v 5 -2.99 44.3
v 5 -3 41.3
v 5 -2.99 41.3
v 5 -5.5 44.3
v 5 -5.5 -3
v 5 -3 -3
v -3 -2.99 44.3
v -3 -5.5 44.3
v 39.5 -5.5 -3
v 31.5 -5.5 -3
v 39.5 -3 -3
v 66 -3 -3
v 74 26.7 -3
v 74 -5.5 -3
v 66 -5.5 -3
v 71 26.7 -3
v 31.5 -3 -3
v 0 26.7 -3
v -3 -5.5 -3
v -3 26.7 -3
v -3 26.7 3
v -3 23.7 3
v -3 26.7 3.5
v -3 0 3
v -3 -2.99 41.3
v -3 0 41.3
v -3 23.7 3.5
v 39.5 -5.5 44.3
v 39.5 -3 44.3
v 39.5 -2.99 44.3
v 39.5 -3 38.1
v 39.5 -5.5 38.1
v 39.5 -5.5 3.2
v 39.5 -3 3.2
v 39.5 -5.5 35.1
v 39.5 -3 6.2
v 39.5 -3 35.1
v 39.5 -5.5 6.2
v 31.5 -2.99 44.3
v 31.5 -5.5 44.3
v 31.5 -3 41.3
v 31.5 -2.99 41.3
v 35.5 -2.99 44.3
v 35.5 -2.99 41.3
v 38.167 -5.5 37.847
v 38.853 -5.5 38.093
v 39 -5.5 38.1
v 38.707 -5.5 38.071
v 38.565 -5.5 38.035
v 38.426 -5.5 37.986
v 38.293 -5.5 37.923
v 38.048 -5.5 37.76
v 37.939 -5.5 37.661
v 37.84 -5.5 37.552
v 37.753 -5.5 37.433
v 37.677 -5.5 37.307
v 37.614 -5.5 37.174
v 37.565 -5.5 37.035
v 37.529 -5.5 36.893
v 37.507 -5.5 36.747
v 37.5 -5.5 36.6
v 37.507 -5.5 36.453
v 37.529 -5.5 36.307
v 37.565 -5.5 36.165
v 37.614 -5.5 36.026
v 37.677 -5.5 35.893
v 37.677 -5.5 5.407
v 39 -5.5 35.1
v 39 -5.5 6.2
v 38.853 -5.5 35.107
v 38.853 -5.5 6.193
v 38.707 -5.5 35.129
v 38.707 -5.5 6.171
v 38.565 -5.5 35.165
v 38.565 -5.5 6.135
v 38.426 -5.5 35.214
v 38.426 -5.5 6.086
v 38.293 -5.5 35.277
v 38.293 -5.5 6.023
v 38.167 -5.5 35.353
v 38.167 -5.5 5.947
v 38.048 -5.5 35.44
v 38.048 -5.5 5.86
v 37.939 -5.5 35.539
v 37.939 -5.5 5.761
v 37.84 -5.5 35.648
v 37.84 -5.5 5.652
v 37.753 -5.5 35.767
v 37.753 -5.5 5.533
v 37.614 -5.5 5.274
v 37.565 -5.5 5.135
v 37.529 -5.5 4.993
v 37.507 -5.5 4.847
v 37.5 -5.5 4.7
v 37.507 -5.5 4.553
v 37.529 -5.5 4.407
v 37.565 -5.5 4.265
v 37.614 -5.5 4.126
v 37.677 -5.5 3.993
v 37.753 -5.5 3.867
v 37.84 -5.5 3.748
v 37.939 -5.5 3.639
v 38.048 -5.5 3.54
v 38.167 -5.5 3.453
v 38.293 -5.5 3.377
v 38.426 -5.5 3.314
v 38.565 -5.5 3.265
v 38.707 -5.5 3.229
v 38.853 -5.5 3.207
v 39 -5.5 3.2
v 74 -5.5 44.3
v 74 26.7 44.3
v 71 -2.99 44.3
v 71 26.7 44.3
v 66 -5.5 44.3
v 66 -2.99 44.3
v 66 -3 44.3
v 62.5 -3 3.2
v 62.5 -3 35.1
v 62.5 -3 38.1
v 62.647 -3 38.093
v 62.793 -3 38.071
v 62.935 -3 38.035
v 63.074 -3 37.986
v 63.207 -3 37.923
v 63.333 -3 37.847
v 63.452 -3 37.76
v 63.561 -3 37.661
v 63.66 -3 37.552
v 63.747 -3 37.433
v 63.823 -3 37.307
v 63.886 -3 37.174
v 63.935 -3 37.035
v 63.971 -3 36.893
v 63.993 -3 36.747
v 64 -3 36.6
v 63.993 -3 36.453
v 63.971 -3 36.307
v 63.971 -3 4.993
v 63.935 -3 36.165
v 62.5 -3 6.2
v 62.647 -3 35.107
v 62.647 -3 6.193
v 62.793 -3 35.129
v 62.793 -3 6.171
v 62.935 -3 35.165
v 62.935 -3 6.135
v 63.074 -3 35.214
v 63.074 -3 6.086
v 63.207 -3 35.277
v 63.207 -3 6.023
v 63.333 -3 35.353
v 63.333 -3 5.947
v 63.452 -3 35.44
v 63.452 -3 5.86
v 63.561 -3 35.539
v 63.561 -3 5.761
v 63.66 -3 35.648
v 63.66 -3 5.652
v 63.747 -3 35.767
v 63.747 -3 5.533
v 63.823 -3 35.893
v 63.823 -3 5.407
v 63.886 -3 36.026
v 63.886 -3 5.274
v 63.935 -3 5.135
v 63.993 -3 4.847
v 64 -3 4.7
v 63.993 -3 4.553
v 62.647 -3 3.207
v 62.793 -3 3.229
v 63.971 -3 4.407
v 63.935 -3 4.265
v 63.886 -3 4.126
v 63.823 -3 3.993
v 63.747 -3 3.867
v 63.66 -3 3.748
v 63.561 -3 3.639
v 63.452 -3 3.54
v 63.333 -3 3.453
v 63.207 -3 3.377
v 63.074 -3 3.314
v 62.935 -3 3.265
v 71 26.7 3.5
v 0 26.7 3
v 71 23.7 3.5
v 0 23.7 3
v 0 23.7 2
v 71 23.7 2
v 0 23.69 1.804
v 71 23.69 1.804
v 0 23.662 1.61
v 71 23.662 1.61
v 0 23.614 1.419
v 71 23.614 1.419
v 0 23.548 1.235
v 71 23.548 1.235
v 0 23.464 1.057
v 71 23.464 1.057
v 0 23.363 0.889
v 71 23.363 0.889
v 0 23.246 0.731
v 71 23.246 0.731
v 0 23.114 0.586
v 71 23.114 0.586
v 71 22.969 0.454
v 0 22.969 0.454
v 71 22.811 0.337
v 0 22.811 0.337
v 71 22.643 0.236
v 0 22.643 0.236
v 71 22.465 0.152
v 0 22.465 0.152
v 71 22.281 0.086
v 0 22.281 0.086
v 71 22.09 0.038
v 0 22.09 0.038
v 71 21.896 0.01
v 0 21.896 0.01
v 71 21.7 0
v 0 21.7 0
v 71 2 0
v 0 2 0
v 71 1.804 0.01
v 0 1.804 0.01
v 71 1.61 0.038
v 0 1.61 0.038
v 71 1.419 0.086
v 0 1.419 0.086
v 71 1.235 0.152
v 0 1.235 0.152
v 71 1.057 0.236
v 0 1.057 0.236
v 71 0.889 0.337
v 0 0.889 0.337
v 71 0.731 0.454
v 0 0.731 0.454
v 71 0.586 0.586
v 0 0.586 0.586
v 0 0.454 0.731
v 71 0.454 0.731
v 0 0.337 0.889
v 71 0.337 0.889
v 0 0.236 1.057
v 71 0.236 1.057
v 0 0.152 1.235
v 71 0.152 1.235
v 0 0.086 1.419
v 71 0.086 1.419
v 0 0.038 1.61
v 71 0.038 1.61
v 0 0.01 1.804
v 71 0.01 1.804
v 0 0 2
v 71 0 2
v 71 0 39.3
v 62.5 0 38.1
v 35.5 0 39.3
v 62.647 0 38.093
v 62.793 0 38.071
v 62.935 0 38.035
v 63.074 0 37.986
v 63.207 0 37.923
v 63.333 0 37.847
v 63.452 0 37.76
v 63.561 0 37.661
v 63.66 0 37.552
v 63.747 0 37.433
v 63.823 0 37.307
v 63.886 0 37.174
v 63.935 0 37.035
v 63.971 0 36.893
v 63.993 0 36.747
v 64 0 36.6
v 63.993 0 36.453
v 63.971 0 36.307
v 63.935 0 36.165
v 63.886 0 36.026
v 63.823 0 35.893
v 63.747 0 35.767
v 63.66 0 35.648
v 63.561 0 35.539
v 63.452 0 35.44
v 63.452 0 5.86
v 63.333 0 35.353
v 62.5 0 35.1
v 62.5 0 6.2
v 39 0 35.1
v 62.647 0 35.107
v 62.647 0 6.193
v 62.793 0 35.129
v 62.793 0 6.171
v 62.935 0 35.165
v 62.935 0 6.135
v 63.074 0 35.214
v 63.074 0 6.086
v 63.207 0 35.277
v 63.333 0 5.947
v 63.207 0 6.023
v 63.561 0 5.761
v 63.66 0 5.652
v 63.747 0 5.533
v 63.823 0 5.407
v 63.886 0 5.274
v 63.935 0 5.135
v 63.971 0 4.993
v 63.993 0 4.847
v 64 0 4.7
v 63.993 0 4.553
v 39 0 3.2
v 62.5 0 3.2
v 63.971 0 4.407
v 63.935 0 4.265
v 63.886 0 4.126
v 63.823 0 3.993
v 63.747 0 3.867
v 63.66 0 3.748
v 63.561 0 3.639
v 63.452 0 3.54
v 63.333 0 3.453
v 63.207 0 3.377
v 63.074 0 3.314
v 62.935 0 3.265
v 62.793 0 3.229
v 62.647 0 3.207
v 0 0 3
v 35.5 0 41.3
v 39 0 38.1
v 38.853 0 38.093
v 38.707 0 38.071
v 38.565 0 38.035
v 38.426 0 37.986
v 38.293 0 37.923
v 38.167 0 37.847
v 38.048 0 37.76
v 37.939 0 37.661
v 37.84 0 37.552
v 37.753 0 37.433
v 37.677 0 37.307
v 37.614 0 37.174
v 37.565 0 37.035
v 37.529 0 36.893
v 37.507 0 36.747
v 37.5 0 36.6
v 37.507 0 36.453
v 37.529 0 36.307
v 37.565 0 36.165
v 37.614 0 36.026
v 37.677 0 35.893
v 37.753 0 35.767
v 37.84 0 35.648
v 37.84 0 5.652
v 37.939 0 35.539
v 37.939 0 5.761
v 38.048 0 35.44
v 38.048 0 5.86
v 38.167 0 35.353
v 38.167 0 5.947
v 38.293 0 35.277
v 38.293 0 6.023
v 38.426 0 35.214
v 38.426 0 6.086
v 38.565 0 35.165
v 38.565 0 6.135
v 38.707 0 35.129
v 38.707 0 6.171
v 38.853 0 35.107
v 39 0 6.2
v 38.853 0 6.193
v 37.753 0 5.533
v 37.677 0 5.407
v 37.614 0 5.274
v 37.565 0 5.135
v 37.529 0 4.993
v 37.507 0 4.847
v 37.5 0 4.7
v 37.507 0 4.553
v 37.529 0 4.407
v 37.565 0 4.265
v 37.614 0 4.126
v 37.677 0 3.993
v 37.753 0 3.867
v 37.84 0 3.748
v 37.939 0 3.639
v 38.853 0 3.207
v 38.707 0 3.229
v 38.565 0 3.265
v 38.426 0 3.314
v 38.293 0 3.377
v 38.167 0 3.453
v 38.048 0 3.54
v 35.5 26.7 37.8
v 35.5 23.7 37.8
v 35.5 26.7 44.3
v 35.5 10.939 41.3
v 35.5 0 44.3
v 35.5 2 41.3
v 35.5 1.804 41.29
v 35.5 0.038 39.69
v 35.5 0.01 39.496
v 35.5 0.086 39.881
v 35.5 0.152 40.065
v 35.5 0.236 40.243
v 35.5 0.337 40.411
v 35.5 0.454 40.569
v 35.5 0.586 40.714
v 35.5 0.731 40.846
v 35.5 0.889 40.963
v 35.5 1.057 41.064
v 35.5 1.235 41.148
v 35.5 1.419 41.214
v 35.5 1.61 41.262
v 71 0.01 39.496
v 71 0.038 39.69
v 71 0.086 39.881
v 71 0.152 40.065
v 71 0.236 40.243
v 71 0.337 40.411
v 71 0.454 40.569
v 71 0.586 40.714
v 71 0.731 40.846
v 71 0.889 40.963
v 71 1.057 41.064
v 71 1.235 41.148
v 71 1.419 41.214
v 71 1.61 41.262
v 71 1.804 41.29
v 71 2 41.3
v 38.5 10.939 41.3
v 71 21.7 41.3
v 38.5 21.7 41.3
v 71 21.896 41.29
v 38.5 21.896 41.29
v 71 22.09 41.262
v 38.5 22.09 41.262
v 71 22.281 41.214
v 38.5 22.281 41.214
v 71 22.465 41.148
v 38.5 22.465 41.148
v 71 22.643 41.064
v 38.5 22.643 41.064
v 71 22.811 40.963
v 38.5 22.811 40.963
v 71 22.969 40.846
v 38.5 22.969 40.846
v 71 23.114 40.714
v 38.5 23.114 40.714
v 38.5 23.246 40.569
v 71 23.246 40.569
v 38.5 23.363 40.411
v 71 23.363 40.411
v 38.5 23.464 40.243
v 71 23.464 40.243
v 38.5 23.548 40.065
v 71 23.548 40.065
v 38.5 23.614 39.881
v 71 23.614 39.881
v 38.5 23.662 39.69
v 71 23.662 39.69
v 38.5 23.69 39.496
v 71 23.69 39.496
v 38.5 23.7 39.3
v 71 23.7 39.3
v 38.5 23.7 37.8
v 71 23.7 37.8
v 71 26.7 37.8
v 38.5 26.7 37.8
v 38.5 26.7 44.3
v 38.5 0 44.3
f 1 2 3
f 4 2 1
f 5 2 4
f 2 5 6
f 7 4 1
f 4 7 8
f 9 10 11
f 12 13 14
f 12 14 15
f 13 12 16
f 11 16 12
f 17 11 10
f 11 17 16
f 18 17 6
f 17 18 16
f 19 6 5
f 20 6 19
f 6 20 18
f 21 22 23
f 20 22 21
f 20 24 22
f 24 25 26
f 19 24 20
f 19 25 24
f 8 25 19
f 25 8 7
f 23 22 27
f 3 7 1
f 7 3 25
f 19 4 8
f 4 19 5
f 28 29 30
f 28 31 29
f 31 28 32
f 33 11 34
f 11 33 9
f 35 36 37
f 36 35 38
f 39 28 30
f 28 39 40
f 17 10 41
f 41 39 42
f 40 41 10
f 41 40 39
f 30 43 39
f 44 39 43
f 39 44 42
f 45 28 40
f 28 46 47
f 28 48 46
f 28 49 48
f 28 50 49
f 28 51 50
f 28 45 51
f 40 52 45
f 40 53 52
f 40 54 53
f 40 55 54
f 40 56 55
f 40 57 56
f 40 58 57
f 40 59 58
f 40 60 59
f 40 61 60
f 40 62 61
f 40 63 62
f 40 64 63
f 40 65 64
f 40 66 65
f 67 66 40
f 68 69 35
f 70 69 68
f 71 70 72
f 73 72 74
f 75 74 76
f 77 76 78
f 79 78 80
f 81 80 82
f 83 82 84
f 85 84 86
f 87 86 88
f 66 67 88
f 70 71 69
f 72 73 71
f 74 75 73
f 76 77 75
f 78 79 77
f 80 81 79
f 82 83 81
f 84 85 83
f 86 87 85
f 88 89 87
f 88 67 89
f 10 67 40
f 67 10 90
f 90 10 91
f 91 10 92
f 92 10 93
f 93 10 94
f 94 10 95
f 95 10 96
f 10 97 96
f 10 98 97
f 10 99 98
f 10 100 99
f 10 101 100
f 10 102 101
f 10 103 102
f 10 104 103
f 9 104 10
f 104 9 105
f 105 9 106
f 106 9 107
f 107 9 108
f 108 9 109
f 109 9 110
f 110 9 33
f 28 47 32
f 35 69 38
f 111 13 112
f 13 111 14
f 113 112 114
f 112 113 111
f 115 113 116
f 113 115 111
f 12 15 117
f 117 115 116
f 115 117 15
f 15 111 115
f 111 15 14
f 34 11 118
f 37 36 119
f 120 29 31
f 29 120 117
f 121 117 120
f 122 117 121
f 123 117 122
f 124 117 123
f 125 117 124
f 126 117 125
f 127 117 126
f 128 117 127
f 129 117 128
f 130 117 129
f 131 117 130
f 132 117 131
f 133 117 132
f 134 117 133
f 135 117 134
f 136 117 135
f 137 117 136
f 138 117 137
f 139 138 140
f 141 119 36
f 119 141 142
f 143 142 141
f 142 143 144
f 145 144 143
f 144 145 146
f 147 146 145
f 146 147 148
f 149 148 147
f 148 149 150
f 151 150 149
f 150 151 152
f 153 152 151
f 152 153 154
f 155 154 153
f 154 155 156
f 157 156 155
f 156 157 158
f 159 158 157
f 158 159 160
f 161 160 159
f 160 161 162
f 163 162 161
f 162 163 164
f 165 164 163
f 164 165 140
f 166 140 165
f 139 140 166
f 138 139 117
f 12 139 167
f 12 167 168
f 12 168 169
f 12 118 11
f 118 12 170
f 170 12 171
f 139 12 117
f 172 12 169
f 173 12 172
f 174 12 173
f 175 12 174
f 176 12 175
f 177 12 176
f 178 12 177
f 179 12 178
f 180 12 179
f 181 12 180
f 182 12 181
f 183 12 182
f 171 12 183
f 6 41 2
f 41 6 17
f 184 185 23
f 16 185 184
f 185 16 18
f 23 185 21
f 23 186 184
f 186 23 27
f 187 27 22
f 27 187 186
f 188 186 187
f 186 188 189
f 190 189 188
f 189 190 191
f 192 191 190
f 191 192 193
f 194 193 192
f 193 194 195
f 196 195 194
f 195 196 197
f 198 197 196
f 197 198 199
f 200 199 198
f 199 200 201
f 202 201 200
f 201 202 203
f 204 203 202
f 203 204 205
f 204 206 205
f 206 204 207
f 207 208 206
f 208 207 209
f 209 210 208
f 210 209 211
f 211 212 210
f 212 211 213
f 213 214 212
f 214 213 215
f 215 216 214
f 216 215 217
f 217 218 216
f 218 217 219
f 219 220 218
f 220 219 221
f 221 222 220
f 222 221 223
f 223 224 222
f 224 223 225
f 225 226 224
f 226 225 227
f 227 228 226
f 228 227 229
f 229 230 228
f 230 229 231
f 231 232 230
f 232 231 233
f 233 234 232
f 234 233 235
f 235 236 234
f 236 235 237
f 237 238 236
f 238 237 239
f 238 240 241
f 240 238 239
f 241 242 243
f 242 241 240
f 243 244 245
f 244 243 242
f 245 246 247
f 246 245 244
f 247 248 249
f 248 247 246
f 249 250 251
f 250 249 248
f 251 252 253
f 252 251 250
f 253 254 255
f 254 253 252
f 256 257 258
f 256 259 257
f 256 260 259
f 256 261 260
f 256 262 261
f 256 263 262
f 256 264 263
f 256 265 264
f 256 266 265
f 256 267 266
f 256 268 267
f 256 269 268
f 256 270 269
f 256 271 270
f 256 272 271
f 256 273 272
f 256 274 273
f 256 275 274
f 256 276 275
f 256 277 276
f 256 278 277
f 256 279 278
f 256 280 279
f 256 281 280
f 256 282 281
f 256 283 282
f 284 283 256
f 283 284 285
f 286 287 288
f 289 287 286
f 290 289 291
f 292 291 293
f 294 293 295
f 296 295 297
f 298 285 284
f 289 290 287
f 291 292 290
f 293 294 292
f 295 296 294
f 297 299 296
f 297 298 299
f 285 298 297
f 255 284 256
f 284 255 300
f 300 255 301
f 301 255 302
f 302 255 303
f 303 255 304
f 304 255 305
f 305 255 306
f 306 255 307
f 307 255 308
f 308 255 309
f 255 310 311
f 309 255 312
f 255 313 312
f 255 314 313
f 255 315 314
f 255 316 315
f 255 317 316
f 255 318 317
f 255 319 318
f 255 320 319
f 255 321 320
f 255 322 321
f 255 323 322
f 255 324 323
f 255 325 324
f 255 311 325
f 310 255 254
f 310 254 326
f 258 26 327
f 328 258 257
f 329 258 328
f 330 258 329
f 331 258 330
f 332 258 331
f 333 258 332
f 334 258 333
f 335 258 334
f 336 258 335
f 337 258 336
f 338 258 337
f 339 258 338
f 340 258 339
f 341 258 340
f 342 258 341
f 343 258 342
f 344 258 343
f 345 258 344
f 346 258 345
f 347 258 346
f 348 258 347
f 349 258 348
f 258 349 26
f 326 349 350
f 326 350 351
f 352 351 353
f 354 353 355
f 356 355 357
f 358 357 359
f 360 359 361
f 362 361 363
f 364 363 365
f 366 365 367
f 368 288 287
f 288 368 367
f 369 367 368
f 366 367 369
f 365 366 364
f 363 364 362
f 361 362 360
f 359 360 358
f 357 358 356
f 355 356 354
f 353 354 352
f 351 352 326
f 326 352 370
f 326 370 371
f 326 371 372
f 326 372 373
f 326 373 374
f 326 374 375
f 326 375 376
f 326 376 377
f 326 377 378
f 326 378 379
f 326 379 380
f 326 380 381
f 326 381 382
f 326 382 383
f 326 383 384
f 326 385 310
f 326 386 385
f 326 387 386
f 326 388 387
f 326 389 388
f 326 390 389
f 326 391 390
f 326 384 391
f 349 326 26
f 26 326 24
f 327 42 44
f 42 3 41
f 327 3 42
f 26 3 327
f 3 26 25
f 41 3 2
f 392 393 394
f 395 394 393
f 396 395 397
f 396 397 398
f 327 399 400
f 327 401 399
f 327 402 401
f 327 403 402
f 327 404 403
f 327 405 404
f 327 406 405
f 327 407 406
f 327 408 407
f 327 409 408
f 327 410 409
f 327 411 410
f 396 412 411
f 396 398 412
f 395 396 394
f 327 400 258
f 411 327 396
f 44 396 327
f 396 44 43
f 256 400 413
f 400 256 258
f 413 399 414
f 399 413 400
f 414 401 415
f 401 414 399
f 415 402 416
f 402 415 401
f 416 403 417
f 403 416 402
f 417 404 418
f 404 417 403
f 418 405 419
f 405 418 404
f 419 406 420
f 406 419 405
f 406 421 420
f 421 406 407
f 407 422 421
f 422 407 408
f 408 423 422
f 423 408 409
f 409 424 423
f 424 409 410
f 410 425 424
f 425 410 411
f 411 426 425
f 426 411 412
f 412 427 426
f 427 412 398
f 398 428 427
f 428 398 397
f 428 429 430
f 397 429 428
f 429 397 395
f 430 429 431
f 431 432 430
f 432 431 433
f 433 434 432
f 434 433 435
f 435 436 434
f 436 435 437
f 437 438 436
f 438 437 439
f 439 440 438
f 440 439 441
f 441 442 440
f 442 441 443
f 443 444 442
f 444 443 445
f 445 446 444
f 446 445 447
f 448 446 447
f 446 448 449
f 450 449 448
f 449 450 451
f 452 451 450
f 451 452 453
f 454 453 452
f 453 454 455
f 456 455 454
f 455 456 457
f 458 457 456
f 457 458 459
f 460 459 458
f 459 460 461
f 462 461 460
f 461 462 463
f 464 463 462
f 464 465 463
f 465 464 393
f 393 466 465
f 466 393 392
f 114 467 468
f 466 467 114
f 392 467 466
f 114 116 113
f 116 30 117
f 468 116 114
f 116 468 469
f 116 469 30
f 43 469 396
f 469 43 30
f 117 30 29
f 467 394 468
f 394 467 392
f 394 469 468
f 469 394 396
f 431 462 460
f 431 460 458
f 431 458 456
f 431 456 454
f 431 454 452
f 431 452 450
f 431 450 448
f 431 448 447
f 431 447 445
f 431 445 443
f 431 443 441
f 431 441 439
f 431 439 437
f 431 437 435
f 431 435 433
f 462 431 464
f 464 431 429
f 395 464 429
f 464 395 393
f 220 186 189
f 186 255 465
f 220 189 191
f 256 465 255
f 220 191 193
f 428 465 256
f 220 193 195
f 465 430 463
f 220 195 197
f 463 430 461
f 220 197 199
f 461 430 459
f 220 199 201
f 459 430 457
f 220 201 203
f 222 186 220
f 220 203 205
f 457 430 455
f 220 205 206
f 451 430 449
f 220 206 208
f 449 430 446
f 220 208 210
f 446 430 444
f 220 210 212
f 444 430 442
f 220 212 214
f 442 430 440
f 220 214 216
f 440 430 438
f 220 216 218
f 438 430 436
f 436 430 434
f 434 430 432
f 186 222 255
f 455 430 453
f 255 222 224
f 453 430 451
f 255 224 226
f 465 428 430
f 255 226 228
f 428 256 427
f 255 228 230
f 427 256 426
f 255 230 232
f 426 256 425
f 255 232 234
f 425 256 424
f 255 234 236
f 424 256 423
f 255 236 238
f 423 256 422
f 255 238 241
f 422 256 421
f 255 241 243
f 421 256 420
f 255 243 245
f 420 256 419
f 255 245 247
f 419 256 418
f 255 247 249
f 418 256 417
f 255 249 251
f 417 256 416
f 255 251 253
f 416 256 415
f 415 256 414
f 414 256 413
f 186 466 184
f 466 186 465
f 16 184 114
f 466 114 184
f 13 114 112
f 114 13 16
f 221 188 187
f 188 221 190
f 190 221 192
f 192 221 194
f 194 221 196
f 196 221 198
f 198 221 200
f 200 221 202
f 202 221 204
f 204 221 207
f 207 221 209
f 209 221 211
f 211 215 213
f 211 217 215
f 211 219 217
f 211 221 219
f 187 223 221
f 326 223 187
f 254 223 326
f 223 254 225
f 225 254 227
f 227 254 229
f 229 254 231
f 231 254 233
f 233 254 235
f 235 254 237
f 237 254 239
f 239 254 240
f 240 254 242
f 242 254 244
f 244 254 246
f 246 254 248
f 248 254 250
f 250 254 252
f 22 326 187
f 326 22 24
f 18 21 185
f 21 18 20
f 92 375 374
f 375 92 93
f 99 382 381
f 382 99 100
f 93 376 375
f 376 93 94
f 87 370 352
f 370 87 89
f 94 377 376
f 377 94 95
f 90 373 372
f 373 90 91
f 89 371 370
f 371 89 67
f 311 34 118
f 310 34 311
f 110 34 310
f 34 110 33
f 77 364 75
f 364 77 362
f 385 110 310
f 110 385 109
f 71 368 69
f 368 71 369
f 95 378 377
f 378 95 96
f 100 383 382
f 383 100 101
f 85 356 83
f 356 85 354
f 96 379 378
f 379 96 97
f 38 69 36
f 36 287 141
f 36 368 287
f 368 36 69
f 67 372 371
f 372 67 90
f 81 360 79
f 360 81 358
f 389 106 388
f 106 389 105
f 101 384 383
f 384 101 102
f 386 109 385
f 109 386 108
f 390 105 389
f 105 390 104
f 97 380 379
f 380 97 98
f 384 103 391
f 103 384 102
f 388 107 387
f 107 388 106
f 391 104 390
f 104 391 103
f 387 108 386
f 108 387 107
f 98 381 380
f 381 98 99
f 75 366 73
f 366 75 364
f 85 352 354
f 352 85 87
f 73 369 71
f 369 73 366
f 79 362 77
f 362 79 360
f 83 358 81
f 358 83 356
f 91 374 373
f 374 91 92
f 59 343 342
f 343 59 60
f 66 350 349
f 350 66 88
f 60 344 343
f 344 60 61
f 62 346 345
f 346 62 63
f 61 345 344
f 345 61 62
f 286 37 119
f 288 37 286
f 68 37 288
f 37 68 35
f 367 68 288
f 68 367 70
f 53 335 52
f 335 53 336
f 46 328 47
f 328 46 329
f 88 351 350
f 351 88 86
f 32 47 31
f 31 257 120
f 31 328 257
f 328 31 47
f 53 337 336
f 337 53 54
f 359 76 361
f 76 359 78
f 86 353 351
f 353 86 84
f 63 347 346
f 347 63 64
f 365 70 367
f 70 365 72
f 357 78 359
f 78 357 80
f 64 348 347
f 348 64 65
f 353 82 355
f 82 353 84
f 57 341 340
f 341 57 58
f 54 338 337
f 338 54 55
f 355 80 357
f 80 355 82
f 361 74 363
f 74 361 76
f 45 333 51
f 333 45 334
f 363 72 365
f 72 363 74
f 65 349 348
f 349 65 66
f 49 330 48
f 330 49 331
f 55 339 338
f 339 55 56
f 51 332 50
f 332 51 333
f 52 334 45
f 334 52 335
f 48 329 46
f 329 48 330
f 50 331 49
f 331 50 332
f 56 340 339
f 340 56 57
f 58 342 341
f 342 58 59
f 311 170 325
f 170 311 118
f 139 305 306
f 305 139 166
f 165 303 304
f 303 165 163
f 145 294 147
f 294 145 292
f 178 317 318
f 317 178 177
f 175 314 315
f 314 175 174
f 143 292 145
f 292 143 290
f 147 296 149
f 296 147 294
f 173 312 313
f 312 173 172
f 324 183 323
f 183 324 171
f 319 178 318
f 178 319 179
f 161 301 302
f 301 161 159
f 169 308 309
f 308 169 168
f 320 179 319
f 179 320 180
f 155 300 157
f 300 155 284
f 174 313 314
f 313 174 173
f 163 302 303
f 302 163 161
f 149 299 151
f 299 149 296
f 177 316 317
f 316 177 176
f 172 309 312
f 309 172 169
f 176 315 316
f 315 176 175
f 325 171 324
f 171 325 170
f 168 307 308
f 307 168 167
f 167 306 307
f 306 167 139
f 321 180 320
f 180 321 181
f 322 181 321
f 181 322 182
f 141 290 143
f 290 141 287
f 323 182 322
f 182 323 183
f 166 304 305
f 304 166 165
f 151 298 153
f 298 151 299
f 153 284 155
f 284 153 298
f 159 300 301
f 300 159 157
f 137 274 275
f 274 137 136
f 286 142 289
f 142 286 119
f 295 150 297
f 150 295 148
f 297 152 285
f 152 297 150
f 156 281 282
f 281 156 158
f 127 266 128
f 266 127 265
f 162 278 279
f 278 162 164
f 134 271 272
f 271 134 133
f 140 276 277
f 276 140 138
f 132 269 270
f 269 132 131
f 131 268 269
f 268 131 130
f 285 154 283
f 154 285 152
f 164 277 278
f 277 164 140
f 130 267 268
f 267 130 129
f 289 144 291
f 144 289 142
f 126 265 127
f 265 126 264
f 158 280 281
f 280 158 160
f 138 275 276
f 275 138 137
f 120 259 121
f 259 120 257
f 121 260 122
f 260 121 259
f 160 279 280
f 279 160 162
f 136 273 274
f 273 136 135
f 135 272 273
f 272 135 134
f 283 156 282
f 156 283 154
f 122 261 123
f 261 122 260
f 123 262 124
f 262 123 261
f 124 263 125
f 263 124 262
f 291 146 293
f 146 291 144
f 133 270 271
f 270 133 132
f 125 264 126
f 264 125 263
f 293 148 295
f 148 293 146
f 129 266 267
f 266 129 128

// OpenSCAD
// =============================================================================
// OpenSCAD Vape Holder Mount
// Based on specification: vape-mount.md & measurements.md
// Compatible with OpenSCAD 2021.01+ and 2026+ Customizer
// =============================================================================
//
// DESIGN SUMMARY:
// - A rigid back plate with a compliant foam/rubber pad (thickness 'p').
// - Full-length bottom lip shelf with front overhang ('O_bottom') to support weight.
// - Partial-length top lip shelf with front overhang ('O_top', length 'L_top_lip')
//   covering the end away from the mouthpiece.
// - Mouthpiece end is completely open so the vape can tilt in/out with one hand
//   and the mouthpiece is never touched or covered.
// - Dual strap slots (top and bottom) with fully radiused edges for 15-20mm straps.
// - Rear standoff rails to provide clearance for straps behind the back plate.
// - Configurable end stops: low wall (~3mm) at mouthpiece end, positive stop at far end.
// - Test piece modes: Section 8 Fit Coupon slice and Lip Test piece.
// =============================================================================

/* [Part Selector (Sec 8 Test Plan)] */
// Which part to render
part = "full"; // ["full": Full Vape Holder, "fit_coupon": Fit Coupon Slice (Sec 8.1), "lip_test": Lip & Strap Slot Test Piece (Sec 8.2), "vape_mockup": Vape Mockup Reference Only]

// Display translucent reference vape in preview mode ($preview)
show_vape_ghost = true;

// Thickness of the fit coupon slice (Sec 8.1: 5-10mm recommended)
coupon_thickness = 8.0; // [4:1:20]

// Print orientation for STL export
export_orientation = "as_modeled"; // ["as_modeled": Native upright, "lay_flat_back": Flat on back plate, "stand_on_end": Standing on far end (zero overhangs!)]

/* [Mount Orientation & Vape Presets] */
// Mount orientation on bike
mount_orientation = "horizontal"; // ["horizontal": Long axis along bar, "vertical": Upright vertical, "custom": Custom parameters]

/* [Vape Measurements (Calipers)] */
// Measurements from measurments.md (Lost Mary OS5000 / BM6000 series)
// Length of main body (excluding mouthpiece protrusion)
vape_body_length = 70.0; // [30:0.5:150]
// Height of body when mounted (top edge to bottom edge)
vape_body_height = 40.3; // [20:0.5:100]
// Thickness/depth of body (front-to-back at thickest point)
vape_body_thickness = 21.2; // [10:0.5:50]
// Corner radius of the vape body
vape_corner_radius = 5.0; // [0:0.5:15]
// Length of mouthpiece section that must stay uncovered (Sec 4.1 & 5.6)
vape_mouth_length = 15.3; // [0:0.5:40]
// Protrusion height of mouthpiece beyond body
vape_mouth_height = 15.0; // [0:0.5:30]
// Width of mouthpiece tube
vape_mouth_width = 16.0; // [5:0.5:30]

/* [Design Variables (Sec 4.2)] */
// Total clearance/slack taken up by pad (Sec 4.2)
c = 1.0; // [0.2:0.1:3.0]
// Closed-cell foam or rubber pad thickness on back plate (Sec 4.2)
p = 1.5; // [0:0.1:4.0]
// Minimum wall and plate thickness (Sec 4.2)
t_wall = 3.0; // [2.0:0.5:6.0]
// Bottom lip overhang curling over vape front face (Sec 4.2: 3-4mm)
O_bottom = 3.5; // [2.0:0.5:8.0]
// Top lip overhang curling over vape front face (Sec 4.2: 3-4mm)
O_top = 3.5; // [2.0:0.5:8.0]
// Ratio of top lip length relative to body length (Sec 4.2: ~50%)
top_lip_ratio = 0.50; // [0.20:0.05:0.80]
// Inside corner fillet radius (Sec 4.2: >= 2.0mm)
r_fillet = 2.0; // [1.0:0.5:5.0]

/* [Strap Configuration (Sec 5.5 & 6)] */
// Width of chosen strap (Sec 4.2: 15-20mm)
strap_w = 20.0; // [12:1:25]
// Thickness of chosen strap (Sec 4.2)
strap_t = 1.5; // [1.0:0.1:3.5]
// Enable rear standoff rails for strap clearance behind plate (Sec 5.1 & 10.2)
enable_rear_standoffs = true;
// Depth of rear strap clearance channel (mm)
rear_channel_depth = 2.5; // [1.5:0.5:5.0]

/* [End Stops (Sec 5.7)] */
// Far end stop (away from mouthpiece)
far_end_stop = "full"; // ["full": Full height end cap, "low": Low wall, "none": Open end]
far_end_stop_h = 8.0; // [4:1:30]
// Mouthpiece end stop (Sec 5.7: low wall ~3mm tall to clear mouthpiece)
mouth_end_stop = "low"; // ["low": Low wall, "none": Open end]
mouth_end_stop_h = 3.0; // [2:0.5:6]

/* [Optional Handlebar Mount Fasteners] */
// Optional fastener holes on back plate for mounting bracket
mount_holes = "none"; // ["none": None, "2_hole_m4": 2x M4 clearance holes, "2_hole_m5": 2x M5 clearance holes, "amps_pattern": 4-hole AMPS pattern (30x38mm)]
mount_hole_spacing = 30.0; // [15:1:60]

/* [Resolution] */
$fn = $preview ? 32 : 64;

// =============================================================================
// Calculated Dimensions
// =============================================================================
L_eff = (mount_orientation == "horizontal") ? vape_body_length :
        (mount_orientation == "vertical")   ? vape_body_height : vape_body_length;

H_eff = (mount_orientation == "horizontal") ? vape_body_height :
        (mount_orientation == "vertical")   ? vape_body_length : vape_body_height;

T_eff = vape_body_thickness;

// Cavity internal dimensions (Sec 5.4):
L_cavity = L_eff + c;           // Inner length
H_cavity = H_eff + c;           // Inner height between bottom & top shelves
Y_cavity = p + T_eff + c;       // Inner depth from back plate to front overhangs

// Top lip length (starts from far end, Sec 5.3)
L_top_lip = L_cavity * top_lip_ratio;
L_mouth_clearance = L_cavity - L_top_lip;

// Strap slot dimensions (Sec 5.5: strap_w + 1.5mm, strap_t + 1.5mm)
slot_length = strap_w + 1.5;
slot_height = strap_t + 1.5;

// Extrusion limits along X
x_start = (mouth_end_stop != "none") ? -t_wall : 0;
x_end   = (far_end_stop != "none")   ? L_cavity + t_wall : L_cavity;
L_total = x_end - x_start;

// Rear standoff offset
rear_standoff_y = enable_rear_standoffs ? -t_wall - rear_channel_depth : -t_wall;

// =============================================================================
// 2D Profiles (Extruded along X)
// =============================================================================

// J-Profile: Back Plate + Full-length Bottom Shelf + Bottom Overhang Lip
module j_profile_2d() {
    union() {
        // Outer box profile
        polygon(points=[
            [-t_wall, -t_wall],
            [Y_cavity + t_wall, -t_wall],
            [Y_cavity + t_wall, O_bottom],
            [Y_cavity, O_bottom],
            [Y_cavity, 0],
            [0, 0],
            [0, H_cavity],
            [-t_wall, H_cavity]
        ]);
        
        // Internal Fillet 1: between back plate (Y=0) and bottom shelf (Z=0)
        translate([r_fillet, r_fillet])
        difference() {
            translate([-r_fillet, -r_fillet]) square([r_fillet, r_fillet]);
            circle(r=r_fillet);
        }
        
        // Internal Fillet 2: between bottom shelf (Z=0) and bottom overhang (Y=Y_cavity)
        translate([Y_cavity - r_fillet, r_fillet])
        difference() {
            translate([0, -r_fillet]) square([r_fillet, r_fillet]);
            circle(r=r_fillet);
        }
    }
}

// Top Lip Profile: Top Shelf + Top Overhang Lip (runs along L_top_lip)
module top_lip_profile_2d() {
    union() {
        polygon(points=[
            [-t_wall, H_cavity],
            [0, H_cavity],
            [Y_cavity, H_cavity],
            [Y_cavity, H_cavity - O_top],
            [Y_cavity + t_wall, H_cavity - O_top],
            [Y_cavity + t_wall, H_cavity + t_wall],
            [-t_wall, H_cavity + t_wall]
        ]);
        
        // Internal Fillet 3: between back plate (Y=0) and top shelf (Z=H_cavity)
        translate([r_fillet, H_cavity - r_fillet])
        difference() {
            translate([-r_fillet, 0]) square([r_fillet, r_fillet]);
            circle(r=r_fillet);
        }
        
        // Internal Fillet 4: between top shelf (Z=H_cavity) and top overhang (Y=Y_cavity)
        translate([Y_cavity - r_fillet, H_cavity - r_fillet])
        difference() {
            square([r_fillet, r_fillet]);
            circle(r=r_fillet);
        }
    }
}

// Helper to extrude 2D profile along X-axis
module extrude_profile_x(len) {
    rotate([90, 0, 90])
    linear_extrude(height=len)
    children();
}

// =============================================================================
// 3D Components
// =============================================================================

// Main Solid Body
module holder_solid() {
    union() {
        // 1. Full-length J-profile (back plate + bottom shelf + bottom lip)
        translate([x_start, 0, 0])
            extrude_profile_x(L_total)
            j_profile_2d();
        
        // 2. Partial top lip & shelf (starts from far end, Sec 5.3)
        x_top_start = L_cavity - L_top_lip;
        translate([x_top_start, 0, 0])
            extrude_profile_x(x_end - x_top_start)
            top_lip_profile_2d();
        
        // 3. Top lip lead-in chamfer (helps vape slide and tilt in smoothly)
        lead_in = min(3.0, L_top_lip / 4);
        translate([x_top_start, 0, H_cavity - O_top])
        polyhedron(
            points=[
                [0, Y_cavity, 0],
                [0, Y_cavity + t_wall, 0],
                [0, Y_cavity + t_wall, O_top + t_wall],
                [0, 0, O_top + t_wall],
                [lead_in, Y_cavity, 0],
                [lead_in, Y_cavity + t_wall, 0],
                [lead_in, Y_cavity + t_wall, O_top + t_wall],
                [lead_in, 0, O_top + t_wall]
            ],
            faces=[
                [0,1,2,3], [4,7,6,5],
                [0,4,5,1], [1,5,6,2],
                [2,6,7,3], [3,7,4,0]
            ]
        );
        
        // 4. Far End Stop (Sec 5.7)
        if (far_end_stop == "full") {
            translate([L_cavity, -t_wall, -t_wall])
                cube([t_wall, Y_cavity + 2 * t_wall, H_cavity + 2 * t_wall]);
        } else if (far_end_stop == "low") {
            translate([L_cavity, -t_wall, -t_wall])
                cube([t_wall, Y_cavity + 2 * t_wall, far_end_stop_h + t_wall]);
        }
        
        // 5. Mouthpiece End Stop (Sec 5.7: low wall ~3mm tall to clear mouthpiece)
        if (mouth_end_stop == "low") {
            translate([-t_wall, -t_wall, -t_wall])
                cube([t_wall, Y_cavity + 2 * t_wall, mouth_end_stop_h + t_wall]);
        }
        
        // 6. Rear Standoff Pads (Sec 5.1 & 10.2: clearance for straps behind plate)
        if (enable_rear_standoffs) {
            standoff_w = 8.0;
            pad_h = H_cavity + 2 * t_wall;
            pad_d = rear_channel_depth + 0.01;
            
            // Left pad
            translate([x_start, rear_standoff_y, -t_wall])
                cube([standoff_w, pad_d, pad_h]);
            
            // Middle divider pad
            mid_x = (L_cavity - standoff_w) / 2;
            translate([mid_x, rear_standoff_y, -t_wall])
                cube([standoff_w, pad_d, pad_h]);
            
            // Right pad
            translate([x_end - standoff_w, rear_standoff_y, -t_wall])
                cube([standoff_w, pad_d, pad_h]);
        }
    }
}

// Strap Slots Cutouts (Sec 5.5: fully rounded edges to prevent fraying)
module strap_slots_cutout() {
    // Two strap positions along X (outside mouthpiece clearance)
    strap1_x = max(L_mouth_clearance + slot_length/2 + 2, L_cavity * 0.28);
    strap2_x = min(L_cavity - slot_length/2 - 4, L_cavity * 0.75);
    
    // Narrow bodies use a single centered strap
    strap_xs = (L_cavity < 50) ? [L_cavity / 2] : [strap1_x, strap2_x];
    
    // Slot Z positions near bottom and top of back plate
    slot_z_bot = r_fillet + slot_height/2 + 1.2;
    slot_z_top = H_cavity - r_fillet - slot_height/2 - 1.2;
    
    cut_depth = t_wall + rear_channel_depth + 4;
    
    for (sx = strap_xs) {
        for (sz = [slot_z_bot, slot_z_top]) {
            translate([sx, -t_wall - rear_channel_depth - 2, sz])
                rotate([-90, 0, 0])
                linear_extrude(height=cut_depth)
                hull() {
                    r = slot_height / 2;
                    translate([-slot_length/2 + r, 0]) circle(r=r);
                    translate([ slot_length/2 - r, 0]) circle(r=r);
                }
        }
    }
}

// Optional Mounting Holes on Back Plate
module mount_holes_cutout() {
    cut_depth = t_wall + rear_channel_depth + 4;
    
    if (mount_holes == "2_hole_m4") {
        cx = L_cavity / 2;
        for (dz = [-mount_hole_spacing/2, mount_hole_spacing/2]) {
            translate([cx, -t_wall - rear_channel_depth - 2, H_cavity/2 + dz])
                rotate([-90, 0, 0])
                cylinder(d=4.5, h=cut_depth);
        }
    } else if (mount_holes == "2_hole_m5") {
        cx = L_cavity / 2;
        for (dz = [-mount_hole_spacing/2, mount_hole_spacing/2]) {
            translate([cx, -t_wall - rear_channel_depth - 2, H_cavity/2 + dz])
                rotate([-90, 0, 0])
                cylinder(d=5.5, h=cut_depth);
        }
    } else if (mount_holes == "amps_pattern") {
        cx = L_cavity / 2;
        cz = H_cavity / 2;
        for (dx = [-15, 15], dz = [-19, 19]) {
            translate([cx + dx, -t_wall - rear_channel_depth - 2, cz + dz])
                rotate([-90, 0, 0])
                cylinder(d=4.5, h=cut_depth);
        }
    }
}

// Complete Finished Vape Holder
module vape_holder_complete() {
    difference() {
        holder_solid();
        strap_slots_cutout();
        mount_holes_cutout();
    }
}

// =============================================================================
// Test Pieces (Section 8 Fit & Test Plan)
// =============================================================================

// Sec 8.1: Fit Coupon (5-10mm cross-section slice of back plate, both lips, and gap)
module fit_coupon() {
    extrude_profile_x(coupon_thickness) {
        j_profile_2d();
        top_lip_profile_2d();
    }
}

// Sec 8.2: Lip & Strap Slot Test Piece
module lip_test_piece() {
    test_len = strap_w + 16.0;
    test_x = L_cavity - test_len;
    intersection() {
        vape_holder_complete();
        translate([test_x, -t_wall * 3, -t_wall * 3])
            cube([test_len, Y_cavity + 6 * t_wall, H_cavity + 6 * t_wall]);
    }
}

// =============================================================================
// Vape Reference Mockup (Based on Caliper Measurements)
// =============================================================================
module rounded_box(size, r) {
    w = size[0];
    d = size[1];
    h = size[2];
    cr = min(r, min(w/2, min(d/2, h/2)));
    hull() {
        translate([cr, cr, cr]) sphere(r=cr);
        translate([w-cr, cr, cr]) sphere(r=cr);
        translate([w-cr, d-cr, cr]) sphere(r=cr);
        translate([cr, d-cr, cr]) sphere(r=cr);
        translate([cr, cr, h-cr]) sphere(r=cr);
        translate([w-cr, cr, h-cr]) sphere(r=cr);
        translate([w-cr, d-cr, h-cr]) sphere(r=cr);
        translate([cr, d-cr, h-cr]) sphere(r=cr);
    }
}

module vape_mockup_body() {
    color([0.2, 0.6, 0.9, 0.65]) {
        translate([c/2, p, c/2]) {
            // Main body
            rounded_box([L_eff, T_eff, H_eff], vape_corner_radius);
            
            // Mouthpiece protrusion (measurments.md)
            if (mount_orientation == "horizontal") {
                // Mouthpiece sticks out to the left (-X)
                translate([-vape_mouth_height, (T_eff - vape_mouth_width)/2, (H_eff - vape_mouth_width)/2])
                    rounded_box([vape_mouth_height, vape_mouth_width, vape_mouth_width], 3.0);
            } else {
                // Mouthpiece sits on top left (+Z)
                translate([4.0, (T_eff - vape_mouth_width)/2, H_eff])
                    rounded_box([vape_mouth_width, vape_mouth_width, vape_mouth_height], 3.0);
            }
        }
    }
}

// =============================================================================
// Output Pipeline & Orientation
// =============================================================================
module oriented_output() {
    if (export_orientation == "lay_flat_back") {
        // Lay flat on back plate (Z=0 on bed)
        translate([0, 0, t_wall + (enable_rear_standoffs ? rear_channel_depth : 0)])
            rotate([-90, 0, 0])
            children();
    } else if (export_orientation == "stand_on_end") {
        // Stand upright on far end stop (Z=0 on bed, prints 100% support-free!)
        translate([0, 0, x_end])
            rotate([0, -90, 0])
            children();
    } else {
        // As modeled
        children();
    }
}

// Render execution
oriented_output() {
    if (part == "full") {
        vape_holder_complete();
        if (show_vape_ghost && $preview) {
            %vape_mockup_body();
        }
    } else if (part == "fit_coupon") {
        fit_coupon();
        if (show_vape_ghost && $preview) {
            %vape_mockup_body();
        }
    } else if (part == "lip_test") {
        lip_test_piece();
    } else if (part == "vape_mockup") {
        vape_mockup_body();
    }
}
